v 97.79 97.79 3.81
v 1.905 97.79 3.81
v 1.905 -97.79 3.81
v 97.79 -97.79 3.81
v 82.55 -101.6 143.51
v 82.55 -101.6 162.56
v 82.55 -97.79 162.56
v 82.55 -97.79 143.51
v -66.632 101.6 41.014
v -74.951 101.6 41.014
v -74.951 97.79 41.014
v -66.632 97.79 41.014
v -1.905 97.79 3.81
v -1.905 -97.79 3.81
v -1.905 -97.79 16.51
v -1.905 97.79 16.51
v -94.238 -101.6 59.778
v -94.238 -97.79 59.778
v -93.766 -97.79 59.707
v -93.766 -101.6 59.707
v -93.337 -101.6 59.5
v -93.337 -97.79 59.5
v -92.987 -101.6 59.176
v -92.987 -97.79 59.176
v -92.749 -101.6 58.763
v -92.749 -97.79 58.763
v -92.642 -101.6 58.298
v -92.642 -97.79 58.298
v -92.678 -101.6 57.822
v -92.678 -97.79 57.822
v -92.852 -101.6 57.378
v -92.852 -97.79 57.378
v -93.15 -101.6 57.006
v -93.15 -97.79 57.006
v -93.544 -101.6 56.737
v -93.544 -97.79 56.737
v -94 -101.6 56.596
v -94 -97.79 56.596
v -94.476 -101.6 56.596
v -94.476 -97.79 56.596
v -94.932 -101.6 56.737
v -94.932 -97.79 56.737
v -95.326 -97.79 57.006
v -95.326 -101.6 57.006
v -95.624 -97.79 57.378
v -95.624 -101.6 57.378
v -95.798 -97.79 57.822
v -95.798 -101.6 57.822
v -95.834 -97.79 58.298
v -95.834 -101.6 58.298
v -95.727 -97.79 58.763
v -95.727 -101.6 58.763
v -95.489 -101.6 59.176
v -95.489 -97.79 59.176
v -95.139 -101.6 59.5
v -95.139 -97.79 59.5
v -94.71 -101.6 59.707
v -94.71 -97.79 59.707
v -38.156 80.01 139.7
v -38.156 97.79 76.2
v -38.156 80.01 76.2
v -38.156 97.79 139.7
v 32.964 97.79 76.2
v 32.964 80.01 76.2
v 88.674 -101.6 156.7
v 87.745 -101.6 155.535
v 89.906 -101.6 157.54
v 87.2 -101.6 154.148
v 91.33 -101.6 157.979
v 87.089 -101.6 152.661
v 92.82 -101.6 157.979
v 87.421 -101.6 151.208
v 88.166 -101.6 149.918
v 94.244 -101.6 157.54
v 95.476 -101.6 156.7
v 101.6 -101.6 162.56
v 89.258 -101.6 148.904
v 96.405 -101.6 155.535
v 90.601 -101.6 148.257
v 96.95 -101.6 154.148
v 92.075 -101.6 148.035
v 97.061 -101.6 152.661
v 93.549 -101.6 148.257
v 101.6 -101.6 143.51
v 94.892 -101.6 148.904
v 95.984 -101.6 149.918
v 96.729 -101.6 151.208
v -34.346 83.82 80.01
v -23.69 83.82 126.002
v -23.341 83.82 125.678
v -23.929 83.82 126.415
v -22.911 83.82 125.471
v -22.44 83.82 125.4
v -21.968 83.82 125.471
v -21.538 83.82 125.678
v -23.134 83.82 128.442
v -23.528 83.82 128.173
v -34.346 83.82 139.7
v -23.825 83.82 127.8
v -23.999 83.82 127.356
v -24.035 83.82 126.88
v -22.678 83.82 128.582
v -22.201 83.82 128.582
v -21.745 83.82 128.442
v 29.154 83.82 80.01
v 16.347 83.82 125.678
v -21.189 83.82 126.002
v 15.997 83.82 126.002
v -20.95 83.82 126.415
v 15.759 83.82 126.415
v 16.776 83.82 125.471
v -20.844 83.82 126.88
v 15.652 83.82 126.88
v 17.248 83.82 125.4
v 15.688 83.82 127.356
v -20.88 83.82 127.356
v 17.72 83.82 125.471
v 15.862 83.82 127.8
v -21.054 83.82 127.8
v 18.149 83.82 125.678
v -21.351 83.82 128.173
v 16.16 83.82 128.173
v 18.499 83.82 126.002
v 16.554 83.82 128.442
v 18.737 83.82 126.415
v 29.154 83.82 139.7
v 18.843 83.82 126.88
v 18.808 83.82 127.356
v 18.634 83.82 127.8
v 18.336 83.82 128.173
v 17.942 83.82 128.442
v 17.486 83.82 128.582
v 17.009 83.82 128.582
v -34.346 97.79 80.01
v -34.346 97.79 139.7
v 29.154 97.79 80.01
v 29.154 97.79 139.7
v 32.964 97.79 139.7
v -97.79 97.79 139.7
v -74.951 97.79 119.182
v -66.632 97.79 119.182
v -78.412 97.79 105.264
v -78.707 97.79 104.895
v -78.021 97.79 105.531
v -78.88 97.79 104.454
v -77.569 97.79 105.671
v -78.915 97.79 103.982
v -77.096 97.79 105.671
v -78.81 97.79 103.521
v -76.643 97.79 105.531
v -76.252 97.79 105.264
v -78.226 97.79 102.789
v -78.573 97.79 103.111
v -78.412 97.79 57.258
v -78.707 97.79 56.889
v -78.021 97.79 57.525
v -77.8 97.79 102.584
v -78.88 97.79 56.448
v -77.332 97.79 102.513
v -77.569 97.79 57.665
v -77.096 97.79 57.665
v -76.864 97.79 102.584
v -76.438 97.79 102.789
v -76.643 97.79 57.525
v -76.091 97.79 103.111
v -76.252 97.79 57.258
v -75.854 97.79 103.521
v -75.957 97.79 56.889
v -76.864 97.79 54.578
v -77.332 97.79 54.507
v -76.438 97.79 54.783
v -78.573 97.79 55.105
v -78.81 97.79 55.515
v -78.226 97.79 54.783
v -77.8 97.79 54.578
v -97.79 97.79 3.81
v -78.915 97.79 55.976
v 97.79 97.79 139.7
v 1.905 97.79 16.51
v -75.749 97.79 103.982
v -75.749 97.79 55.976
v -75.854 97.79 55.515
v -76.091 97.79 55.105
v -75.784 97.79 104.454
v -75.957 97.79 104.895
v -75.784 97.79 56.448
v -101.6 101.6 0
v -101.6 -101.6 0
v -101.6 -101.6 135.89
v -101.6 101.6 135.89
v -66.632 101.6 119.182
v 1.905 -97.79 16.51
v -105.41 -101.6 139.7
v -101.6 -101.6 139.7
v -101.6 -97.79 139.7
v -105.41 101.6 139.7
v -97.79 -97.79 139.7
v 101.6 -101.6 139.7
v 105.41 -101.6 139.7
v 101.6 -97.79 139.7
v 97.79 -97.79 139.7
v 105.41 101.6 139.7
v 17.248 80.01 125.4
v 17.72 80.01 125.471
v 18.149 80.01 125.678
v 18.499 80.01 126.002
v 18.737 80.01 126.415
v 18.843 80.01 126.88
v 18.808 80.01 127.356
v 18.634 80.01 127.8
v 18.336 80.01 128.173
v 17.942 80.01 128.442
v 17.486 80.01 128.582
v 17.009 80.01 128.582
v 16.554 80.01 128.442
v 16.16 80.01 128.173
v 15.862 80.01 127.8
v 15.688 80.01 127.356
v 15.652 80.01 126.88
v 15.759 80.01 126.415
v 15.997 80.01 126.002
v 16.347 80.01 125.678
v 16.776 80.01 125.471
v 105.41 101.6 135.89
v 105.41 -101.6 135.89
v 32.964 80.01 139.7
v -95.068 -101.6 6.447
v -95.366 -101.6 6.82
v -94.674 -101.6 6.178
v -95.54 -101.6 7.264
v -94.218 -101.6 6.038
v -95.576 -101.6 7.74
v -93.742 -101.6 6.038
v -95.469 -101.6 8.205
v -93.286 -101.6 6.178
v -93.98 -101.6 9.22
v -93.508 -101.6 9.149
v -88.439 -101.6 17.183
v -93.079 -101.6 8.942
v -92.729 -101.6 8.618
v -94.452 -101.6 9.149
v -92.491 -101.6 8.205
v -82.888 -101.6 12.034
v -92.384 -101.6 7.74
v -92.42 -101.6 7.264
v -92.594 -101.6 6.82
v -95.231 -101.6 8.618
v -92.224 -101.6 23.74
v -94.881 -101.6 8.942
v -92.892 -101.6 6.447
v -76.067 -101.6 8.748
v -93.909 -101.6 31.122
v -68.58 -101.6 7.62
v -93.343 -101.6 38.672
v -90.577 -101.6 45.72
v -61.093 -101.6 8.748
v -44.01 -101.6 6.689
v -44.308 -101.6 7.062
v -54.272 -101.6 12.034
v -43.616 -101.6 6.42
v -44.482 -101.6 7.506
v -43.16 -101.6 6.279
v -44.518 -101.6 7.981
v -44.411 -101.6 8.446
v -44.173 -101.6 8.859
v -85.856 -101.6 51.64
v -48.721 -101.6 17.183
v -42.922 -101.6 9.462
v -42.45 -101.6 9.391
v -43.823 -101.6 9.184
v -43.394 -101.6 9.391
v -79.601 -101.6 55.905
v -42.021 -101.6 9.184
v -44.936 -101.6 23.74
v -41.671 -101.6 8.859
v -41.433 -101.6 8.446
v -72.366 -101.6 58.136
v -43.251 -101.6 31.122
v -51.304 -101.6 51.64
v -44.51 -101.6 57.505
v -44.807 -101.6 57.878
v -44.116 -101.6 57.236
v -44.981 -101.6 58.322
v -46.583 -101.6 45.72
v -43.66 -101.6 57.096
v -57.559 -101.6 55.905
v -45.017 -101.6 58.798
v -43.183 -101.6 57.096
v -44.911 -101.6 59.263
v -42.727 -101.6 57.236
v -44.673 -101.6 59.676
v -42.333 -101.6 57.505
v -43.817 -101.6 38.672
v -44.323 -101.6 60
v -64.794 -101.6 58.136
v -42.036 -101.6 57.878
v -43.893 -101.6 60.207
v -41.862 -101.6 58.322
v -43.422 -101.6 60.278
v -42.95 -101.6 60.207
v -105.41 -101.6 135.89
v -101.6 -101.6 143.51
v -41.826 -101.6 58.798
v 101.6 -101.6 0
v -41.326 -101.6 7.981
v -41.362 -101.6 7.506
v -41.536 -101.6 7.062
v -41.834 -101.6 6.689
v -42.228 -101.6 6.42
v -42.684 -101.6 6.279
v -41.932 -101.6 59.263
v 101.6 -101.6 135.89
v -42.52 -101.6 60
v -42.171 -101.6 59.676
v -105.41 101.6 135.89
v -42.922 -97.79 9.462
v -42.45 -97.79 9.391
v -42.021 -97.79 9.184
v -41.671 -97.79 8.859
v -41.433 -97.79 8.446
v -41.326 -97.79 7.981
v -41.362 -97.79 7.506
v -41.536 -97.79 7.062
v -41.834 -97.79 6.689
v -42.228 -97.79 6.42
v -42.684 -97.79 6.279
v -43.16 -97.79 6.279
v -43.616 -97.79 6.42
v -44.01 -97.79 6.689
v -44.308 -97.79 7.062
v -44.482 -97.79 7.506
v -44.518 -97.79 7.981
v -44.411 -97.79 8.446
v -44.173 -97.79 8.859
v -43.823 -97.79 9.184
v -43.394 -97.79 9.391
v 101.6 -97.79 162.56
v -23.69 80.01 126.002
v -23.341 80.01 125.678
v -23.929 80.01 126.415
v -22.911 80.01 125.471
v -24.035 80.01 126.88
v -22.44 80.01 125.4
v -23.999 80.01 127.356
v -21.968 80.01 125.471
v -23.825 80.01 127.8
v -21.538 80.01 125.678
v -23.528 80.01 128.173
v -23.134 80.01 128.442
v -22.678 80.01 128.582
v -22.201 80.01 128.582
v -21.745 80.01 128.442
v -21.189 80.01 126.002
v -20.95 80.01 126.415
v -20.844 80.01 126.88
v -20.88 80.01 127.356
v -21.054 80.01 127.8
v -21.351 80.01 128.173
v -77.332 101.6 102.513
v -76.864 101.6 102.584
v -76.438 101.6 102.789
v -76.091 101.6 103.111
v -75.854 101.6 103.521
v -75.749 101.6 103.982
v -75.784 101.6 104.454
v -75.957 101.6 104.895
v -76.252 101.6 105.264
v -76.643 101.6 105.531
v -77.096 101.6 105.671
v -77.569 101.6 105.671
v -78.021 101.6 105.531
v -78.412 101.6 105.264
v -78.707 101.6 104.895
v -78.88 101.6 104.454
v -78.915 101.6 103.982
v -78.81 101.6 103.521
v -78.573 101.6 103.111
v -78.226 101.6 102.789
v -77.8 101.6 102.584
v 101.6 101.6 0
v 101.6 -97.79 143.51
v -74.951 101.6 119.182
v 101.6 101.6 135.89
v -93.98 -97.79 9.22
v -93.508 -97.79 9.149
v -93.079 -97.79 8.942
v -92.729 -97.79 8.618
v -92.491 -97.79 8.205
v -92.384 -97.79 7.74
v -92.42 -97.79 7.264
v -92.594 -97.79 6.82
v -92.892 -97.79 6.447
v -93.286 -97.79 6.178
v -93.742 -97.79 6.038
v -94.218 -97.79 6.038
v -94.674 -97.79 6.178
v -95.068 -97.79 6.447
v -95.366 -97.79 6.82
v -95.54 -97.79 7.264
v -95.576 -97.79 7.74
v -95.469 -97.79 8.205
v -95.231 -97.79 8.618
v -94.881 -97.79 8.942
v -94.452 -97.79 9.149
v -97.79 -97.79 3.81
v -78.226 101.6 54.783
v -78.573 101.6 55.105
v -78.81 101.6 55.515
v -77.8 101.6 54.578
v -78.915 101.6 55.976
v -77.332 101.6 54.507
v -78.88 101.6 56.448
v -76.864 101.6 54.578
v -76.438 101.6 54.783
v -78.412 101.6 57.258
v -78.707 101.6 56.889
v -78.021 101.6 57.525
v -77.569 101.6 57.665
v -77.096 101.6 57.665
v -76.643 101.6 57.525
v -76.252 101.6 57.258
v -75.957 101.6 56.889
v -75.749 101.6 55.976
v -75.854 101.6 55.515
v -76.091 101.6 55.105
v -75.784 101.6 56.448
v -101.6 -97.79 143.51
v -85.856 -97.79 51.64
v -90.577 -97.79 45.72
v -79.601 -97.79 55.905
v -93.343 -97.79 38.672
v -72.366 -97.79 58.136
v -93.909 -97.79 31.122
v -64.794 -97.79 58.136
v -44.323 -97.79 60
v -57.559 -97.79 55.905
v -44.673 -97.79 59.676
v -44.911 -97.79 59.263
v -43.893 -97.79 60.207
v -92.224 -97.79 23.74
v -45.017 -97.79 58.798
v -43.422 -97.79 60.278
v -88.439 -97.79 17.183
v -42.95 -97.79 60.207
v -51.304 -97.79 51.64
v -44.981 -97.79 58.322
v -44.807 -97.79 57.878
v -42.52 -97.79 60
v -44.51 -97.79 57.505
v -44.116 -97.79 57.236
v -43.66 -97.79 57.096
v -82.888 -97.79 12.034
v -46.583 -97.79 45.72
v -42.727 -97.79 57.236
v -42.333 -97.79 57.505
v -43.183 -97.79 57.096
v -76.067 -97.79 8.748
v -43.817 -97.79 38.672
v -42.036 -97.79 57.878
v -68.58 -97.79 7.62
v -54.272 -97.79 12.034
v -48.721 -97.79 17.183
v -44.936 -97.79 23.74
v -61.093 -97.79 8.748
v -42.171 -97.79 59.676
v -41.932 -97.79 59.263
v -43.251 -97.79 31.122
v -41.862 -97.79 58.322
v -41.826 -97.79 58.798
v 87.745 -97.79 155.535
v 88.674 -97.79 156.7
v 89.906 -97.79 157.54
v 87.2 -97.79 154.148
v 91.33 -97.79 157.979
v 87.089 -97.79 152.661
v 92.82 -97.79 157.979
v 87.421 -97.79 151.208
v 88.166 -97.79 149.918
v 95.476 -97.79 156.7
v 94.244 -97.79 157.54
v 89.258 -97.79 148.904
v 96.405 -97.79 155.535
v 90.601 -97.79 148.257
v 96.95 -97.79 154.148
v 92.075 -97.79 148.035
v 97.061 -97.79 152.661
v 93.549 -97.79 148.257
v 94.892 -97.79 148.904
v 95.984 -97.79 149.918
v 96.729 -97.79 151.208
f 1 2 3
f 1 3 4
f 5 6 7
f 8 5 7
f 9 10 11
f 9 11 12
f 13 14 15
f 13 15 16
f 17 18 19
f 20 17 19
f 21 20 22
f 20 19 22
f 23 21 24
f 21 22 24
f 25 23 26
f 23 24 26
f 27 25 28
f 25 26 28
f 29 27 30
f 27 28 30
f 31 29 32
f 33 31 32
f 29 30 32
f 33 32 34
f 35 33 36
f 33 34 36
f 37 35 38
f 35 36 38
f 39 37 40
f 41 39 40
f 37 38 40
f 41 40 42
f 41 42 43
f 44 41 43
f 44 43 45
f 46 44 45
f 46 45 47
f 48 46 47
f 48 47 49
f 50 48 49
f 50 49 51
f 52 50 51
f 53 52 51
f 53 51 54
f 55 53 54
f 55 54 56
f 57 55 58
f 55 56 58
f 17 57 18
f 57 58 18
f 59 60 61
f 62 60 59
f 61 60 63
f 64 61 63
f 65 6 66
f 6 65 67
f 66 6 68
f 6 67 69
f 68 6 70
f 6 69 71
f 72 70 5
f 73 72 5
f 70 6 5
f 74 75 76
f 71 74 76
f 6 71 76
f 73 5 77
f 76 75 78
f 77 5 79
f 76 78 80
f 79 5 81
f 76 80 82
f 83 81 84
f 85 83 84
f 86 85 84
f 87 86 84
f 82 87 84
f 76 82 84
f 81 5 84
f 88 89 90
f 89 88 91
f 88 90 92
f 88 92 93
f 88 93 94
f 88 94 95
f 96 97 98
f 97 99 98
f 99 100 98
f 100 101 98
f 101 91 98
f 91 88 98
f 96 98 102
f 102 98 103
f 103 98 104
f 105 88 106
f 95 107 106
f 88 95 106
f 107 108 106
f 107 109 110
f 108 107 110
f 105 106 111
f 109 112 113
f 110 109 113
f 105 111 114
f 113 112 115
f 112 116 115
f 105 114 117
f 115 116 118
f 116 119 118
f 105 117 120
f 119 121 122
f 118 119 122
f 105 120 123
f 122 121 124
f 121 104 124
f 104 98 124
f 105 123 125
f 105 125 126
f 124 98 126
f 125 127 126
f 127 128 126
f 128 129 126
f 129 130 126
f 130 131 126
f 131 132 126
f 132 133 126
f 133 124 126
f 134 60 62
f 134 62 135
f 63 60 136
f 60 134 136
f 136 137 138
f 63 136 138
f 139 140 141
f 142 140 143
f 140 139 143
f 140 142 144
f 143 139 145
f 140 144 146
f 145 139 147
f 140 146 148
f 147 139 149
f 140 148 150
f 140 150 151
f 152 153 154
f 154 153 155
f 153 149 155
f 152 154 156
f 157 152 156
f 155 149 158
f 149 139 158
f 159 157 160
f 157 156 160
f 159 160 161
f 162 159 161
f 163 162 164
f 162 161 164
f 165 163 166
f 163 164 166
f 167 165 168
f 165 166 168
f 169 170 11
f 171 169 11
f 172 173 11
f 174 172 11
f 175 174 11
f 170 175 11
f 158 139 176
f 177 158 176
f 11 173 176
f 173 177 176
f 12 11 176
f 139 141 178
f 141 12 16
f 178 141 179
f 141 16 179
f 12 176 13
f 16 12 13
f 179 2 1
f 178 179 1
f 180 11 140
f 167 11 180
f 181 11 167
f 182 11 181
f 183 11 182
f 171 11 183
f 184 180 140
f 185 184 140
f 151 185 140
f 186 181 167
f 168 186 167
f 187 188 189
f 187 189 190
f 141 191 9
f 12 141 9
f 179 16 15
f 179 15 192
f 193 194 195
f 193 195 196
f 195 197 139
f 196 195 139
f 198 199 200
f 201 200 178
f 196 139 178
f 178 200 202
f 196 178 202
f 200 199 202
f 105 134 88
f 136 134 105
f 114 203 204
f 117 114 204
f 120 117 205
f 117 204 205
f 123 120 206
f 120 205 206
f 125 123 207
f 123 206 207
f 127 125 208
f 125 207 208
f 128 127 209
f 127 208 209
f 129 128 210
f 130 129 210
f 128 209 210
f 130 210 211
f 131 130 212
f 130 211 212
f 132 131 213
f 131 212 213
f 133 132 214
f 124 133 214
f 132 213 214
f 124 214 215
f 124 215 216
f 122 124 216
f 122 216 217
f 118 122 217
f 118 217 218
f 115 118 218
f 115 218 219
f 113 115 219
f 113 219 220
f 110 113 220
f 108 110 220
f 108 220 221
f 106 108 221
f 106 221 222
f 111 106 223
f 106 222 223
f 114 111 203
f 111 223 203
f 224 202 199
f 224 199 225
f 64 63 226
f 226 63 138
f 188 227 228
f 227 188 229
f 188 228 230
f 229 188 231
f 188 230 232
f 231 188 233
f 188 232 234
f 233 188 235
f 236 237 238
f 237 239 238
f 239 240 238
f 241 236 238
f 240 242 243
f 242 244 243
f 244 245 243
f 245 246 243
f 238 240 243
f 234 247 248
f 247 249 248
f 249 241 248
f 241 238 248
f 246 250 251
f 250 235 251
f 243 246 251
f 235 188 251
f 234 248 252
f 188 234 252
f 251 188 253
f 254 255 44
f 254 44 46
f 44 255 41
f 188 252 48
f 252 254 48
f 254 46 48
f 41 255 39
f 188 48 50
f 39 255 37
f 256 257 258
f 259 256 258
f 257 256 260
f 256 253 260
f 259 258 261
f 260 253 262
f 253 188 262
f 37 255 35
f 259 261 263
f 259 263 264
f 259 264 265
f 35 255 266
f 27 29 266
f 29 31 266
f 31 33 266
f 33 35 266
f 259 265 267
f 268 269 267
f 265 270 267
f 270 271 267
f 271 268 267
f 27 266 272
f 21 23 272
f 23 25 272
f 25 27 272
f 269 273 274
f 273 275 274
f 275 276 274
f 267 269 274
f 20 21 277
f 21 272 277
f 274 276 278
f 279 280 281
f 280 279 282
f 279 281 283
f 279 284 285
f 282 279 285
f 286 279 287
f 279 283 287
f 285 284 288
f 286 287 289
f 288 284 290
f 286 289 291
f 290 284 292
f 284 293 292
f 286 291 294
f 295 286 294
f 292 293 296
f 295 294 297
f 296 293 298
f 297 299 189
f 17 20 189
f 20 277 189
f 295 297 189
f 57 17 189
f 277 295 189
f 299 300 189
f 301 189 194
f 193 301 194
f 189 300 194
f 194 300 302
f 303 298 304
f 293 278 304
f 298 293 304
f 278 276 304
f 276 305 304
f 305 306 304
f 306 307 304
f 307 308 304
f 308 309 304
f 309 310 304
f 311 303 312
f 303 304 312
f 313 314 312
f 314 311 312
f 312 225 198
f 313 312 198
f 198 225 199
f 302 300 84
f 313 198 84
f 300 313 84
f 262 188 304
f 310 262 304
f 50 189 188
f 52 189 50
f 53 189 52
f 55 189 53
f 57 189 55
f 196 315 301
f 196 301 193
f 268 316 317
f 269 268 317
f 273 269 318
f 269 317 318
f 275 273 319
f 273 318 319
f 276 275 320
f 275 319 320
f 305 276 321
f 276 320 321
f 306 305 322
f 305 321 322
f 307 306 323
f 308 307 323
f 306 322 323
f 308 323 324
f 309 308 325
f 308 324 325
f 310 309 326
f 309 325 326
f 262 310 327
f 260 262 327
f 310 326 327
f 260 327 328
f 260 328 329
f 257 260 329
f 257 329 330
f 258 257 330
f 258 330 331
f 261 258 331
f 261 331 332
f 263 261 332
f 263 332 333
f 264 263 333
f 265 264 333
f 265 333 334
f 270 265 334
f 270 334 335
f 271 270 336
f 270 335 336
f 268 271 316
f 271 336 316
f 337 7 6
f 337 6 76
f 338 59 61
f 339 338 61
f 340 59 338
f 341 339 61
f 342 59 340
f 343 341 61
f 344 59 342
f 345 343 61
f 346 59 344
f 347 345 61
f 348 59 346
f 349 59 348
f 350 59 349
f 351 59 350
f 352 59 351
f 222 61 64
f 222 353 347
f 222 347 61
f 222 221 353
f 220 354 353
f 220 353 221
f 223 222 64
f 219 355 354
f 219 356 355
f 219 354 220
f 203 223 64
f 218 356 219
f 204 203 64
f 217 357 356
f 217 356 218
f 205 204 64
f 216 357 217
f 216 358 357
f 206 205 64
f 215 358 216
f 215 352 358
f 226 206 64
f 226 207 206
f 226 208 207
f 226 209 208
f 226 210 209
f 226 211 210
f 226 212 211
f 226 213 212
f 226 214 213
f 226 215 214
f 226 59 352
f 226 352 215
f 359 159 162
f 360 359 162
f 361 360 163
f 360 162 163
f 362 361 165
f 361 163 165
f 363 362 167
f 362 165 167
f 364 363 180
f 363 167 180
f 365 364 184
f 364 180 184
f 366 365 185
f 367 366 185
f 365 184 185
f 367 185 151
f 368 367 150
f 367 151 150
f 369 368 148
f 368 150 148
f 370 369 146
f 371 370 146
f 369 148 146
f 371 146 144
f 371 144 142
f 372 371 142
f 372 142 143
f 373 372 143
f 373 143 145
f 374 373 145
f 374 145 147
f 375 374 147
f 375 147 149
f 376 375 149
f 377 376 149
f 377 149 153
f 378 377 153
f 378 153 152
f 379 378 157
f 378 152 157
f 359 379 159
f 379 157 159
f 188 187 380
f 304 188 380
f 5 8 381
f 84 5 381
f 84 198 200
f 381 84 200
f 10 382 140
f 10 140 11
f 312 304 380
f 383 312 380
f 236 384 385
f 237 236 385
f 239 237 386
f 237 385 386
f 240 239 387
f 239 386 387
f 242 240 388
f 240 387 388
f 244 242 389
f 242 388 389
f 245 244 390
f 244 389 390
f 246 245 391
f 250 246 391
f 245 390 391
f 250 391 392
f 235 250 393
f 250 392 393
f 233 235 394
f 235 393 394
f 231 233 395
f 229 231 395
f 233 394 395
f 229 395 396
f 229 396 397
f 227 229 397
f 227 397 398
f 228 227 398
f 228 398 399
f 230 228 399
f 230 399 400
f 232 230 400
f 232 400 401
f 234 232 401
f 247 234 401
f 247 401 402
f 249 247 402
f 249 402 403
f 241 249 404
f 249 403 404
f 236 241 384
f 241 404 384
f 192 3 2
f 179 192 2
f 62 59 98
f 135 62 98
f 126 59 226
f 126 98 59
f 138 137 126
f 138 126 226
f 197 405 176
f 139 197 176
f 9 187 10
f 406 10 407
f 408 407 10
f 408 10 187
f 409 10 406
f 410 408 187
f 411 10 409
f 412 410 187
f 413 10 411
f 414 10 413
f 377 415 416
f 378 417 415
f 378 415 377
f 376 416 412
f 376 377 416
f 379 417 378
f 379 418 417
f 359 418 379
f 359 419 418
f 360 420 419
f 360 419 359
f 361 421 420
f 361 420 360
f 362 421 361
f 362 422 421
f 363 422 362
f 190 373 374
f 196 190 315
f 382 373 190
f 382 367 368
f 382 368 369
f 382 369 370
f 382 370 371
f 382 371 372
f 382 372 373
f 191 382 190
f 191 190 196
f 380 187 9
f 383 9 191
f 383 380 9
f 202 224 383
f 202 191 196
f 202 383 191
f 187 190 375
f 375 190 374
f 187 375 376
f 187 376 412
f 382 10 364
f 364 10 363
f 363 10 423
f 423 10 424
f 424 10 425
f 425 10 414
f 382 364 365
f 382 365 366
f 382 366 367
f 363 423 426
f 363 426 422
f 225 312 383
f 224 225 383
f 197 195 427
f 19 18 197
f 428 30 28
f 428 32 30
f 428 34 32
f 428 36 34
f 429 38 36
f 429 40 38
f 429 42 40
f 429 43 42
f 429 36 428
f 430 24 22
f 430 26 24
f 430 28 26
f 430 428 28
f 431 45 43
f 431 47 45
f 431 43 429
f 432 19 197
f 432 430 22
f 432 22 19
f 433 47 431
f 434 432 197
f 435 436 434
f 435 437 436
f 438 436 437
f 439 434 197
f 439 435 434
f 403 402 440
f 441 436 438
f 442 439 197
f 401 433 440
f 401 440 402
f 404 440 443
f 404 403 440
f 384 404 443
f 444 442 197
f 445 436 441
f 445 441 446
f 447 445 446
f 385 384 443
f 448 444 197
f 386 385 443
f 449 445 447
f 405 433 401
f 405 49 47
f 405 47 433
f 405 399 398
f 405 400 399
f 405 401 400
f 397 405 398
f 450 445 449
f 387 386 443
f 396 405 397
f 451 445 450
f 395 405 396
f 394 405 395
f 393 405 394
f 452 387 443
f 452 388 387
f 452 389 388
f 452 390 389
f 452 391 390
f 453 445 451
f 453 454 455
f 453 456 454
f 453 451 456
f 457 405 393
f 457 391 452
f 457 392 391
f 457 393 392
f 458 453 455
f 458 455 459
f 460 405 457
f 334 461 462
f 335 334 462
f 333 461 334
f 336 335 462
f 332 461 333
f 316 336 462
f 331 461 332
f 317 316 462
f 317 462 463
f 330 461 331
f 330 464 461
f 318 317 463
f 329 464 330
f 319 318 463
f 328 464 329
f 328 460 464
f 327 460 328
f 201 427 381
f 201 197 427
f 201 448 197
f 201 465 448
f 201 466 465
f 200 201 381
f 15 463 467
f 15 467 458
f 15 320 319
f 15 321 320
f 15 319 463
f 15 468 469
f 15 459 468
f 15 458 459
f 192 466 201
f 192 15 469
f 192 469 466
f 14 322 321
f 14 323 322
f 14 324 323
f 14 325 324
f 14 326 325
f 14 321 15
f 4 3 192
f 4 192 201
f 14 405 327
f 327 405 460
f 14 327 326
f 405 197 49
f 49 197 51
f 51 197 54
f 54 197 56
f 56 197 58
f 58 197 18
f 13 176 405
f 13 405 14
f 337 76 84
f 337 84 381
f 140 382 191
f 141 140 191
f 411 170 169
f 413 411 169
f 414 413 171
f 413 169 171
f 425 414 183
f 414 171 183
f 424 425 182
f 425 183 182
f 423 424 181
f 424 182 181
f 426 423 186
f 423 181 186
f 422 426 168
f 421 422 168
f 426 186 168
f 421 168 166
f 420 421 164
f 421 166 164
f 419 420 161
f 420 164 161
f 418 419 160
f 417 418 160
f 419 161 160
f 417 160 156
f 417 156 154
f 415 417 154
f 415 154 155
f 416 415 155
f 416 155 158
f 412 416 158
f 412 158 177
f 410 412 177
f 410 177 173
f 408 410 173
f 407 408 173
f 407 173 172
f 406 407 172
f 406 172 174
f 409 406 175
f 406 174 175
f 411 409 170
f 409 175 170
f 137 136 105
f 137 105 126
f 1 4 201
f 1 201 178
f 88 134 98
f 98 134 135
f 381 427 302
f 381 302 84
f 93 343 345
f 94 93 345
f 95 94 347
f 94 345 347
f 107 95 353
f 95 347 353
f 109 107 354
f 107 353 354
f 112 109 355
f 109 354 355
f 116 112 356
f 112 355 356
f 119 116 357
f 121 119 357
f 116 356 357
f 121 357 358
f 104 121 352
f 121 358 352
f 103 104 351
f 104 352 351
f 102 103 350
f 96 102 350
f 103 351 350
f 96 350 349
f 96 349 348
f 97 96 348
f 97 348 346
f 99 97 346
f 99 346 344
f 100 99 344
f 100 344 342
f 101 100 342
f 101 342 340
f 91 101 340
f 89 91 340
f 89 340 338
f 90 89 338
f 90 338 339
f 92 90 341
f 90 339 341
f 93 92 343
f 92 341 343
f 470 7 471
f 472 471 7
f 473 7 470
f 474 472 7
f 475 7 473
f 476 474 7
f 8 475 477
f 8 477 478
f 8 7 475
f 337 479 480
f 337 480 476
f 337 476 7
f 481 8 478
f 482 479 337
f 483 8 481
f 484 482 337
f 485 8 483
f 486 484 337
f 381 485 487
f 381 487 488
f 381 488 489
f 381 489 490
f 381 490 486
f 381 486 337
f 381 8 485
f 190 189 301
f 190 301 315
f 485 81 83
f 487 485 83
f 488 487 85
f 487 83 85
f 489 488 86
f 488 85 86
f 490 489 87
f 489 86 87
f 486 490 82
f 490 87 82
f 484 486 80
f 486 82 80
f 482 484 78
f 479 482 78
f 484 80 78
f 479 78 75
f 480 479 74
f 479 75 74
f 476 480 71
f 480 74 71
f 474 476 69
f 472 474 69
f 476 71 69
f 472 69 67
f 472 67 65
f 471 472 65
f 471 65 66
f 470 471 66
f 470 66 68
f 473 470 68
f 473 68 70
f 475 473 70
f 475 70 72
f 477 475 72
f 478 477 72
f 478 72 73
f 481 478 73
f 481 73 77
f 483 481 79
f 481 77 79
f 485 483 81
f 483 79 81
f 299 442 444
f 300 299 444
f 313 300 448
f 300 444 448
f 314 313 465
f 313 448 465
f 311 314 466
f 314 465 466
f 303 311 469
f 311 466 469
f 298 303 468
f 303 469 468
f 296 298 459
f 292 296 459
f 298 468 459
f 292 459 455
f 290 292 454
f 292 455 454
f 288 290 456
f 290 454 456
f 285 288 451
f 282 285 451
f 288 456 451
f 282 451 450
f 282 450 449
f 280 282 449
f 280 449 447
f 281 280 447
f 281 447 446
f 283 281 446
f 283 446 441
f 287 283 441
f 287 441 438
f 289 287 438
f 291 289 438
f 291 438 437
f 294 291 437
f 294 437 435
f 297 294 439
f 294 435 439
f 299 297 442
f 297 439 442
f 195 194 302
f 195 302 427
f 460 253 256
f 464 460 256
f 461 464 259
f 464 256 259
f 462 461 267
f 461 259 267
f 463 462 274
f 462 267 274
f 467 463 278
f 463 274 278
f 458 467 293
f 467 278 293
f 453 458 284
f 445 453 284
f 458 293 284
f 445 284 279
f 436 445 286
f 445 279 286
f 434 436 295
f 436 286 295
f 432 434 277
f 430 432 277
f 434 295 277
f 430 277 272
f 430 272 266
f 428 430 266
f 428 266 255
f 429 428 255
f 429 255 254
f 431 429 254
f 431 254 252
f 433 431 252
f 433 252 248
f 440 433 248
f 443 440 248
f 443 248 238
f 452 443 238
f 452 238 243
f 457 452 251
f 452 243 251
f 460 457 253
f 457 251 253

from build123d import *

# Parameters (mm, degrees)
SKETCH1_W              = 203.2
SKETCH1_H              = 203.2
OUTTER_BOX_DEPTH       = 139.7
SHELL1_T               = -3.81
SKETCH4_W              = 71.12
SKETCH4_H              = 63.5
RFID_CARD_HOLDER_DEPTH = 17.78
SHELL2_T               = -3.81
SKETCH6_W              = 203.2
SKETCH6_H              = 3.81
BOSS_EXTRUDE4_DEPTH    = 3.81
SKETCH12_W             = 8.3185
SKETCH12_H             = 78.1685
CUT_EXTRUDE7_DEPTH     = 3.81
SKETCH13_W             = 3.81
SKETCH13_H             = 203.2
BOSS_EXTRUDE5_DEPTH    = 3.81
SKETCH14_W             = 3.81
SKETCH14_H             = 203.2
BOSS_EXTRUDE6_DEPTH    = 3.81
SKETCH16_W             = 19.05
SKETCH16_H             = 3.81
BOSS_EXTRUDE7_DEPTH    = 19.05
SKETCH18_R             = 5
CUT_EXTRUDE9_DEPTH     = 3.81
SKETCH5_R              = 25.4
CUT_EXTRUDE10_DEPTH    = 3.81
SKETCH19_R             = 1.6
CUT_EXTRUDE11_DEPTH    = 3.81
SKETCH20_R             = 1.6
CUT_EXTRUDE12_DEPTH    = 3.81
SKETCH21_W             = 3.81
SKETCH21_H             = 195.58
BOSS_EXTRUDE9_DEPTH    = 12.7
SKETCH23_R             = 1.5875
CUT_EXTRUDE13_DEPTH    = 3.81


with BuildPart() as part:
    # Sketch1 → Outter Box (new body)
    with BuildSketch(Plane.XY):
        Rectangle(SKETCH1_W, SKETCH1_H)
    extrude(amount=OUTTER_BOX_DEPTH)

    # Shell1
    shell1_openings = [part.faces().sort_by_distance(p)[0] for p in [
        (0, 0, 139.7),
    ]]
    offset(amount=SHELL1_T, openings=shell1_openings, kind=Kind.INTERSECTION)

    # Sketch12 → Cut-Extrude7 (cut)
    with BuildSketch(Plane(origin=(0, 101.6, 0), x_dir=(1, 0, 0), z_dir=(0, 1, 0))):
        with Locations((-70.791632516, -80.097769103)):
            Rectangle(SKETCH12_W, SKETCH12_H)
    extrude(amount=-CUT_EXTRUDE7_DEPTH, mode=Mode.SUBTRACT)



with BuildPart() as body_2:
    # Sketch4 → RFID Card holder (new body)
    with BuildSketch(Plane.XZ.offset(-97.79)):
        with Locations((-2.595784724, 107.95)):
            Rectangle(SKETCH4_W, SKETCH4_H)
    extrude(amount=RFID_CARD_HOLDER_DEPTH)

    # Shell2
    shell2_openings = [body_2.faces().sort_by_distance(p)[0] for p in [
        (-2.595784724, 97.79, 107.95),
        (-2.595784724, 88.9, 139.7),
    ]]
    offset(amount=SHELL2_T, openings=shell2_openings, kind=Kind.INTERSECTION)

    # Sketch19 → Cut-Extrude11 (cut)
    with BuildSketch(Plane.XZ.offset(-80.01)):
        with Locations(Location((-22.439534724, 127, 0), (0, 0, 270))):
            Circle(SKETCH19_R)
        with Locations(Location((17.247965276, 127, 0), (0, 0, 270))):
            Circle(SKETCH19_R)
    extrude(amount=-CUT_EXTRUDE11_DEPTH, mode=Mode.SUBTRACT)


with BuildPart() as body_3:
    # Sketch6 → Boss-Extrude4 (new body)
    with BuildSketch(Plane.XY.offset(139.7)):
        with Locations((0, -99.695)):
            Rectangle(SKETCH6_W, SKETCH6_H)
    extrude(amount=BOSS_EXTRUDE4_DEPTH)


with BuildPart() as part_1:
    add(part.part)

    add(body_3.part)  # Boss-Extrude5 merges body 3
    # Sketch13 → Boss-Extrude5 (add)
    with BuildSketch(Plane(origin=(101.6, 0, 0), x_dir=(0, 0, -1), z_dir=(1, 0, 0))):
        with Locations((-137.795, 0)):
            Rectangle(SKETCH13_W, SKETCH13_H)
    extrude(amount=BOSS_EXTRUDE5_DEPTH)

    # Sketch14 → Boss-Extrude6 (add)
    with BuildSketch(Plane.ZY.offset(101.6)):
        with Locations((137.795, 0)):
            Rectangle(SKETCH14_W, SKETCH14_H)
    extrude(amount=BOSS_EXTRUDE6_DEPTH)

    # Sketch5 → Cut-Extrude10 (cut)
    with BuildSketch(Plane.XZ.offset(101.6)):
        with Locations(Location((-68.58, 33.02, 0), (0, 0, 270))):
            Circle(SKETCH5_R)
    extrude(amount=-CUT_EXTRUDE10_DEPTH, mode=Mode.SUBTRACT)

    # Sketch20 → Cut-Extrude12 (cut)
    with BuildSketch(Plane(origin=(0, -97.79, 0), x_dir=(1, 0, 0), z_dir=(0, 1, 0))):
        with Locations(Location((-94.237978912, -58.178415522, 0), (0, 0, 270))):
            Circle(SKETCH20_R)
        with Locations(Location((-43.421584478, -58.677978912, 0), (0, 0, 270))):
            Circle(SKETCH20_R)
        with Locations(Location((-42.922021088, -7.861584478, 0), (0, 0, 270))):
            Circle(SKETCH20_R)
        with Locations(Location((-93.980000617, -7.619999383, 0), (0, 0, 270))):
            Circle(SKETCH20_R)
    extrude(amount=-CUT_EXTRUDE12_DEPTH, mode=Mode.SUBTRACT)

    # Sketch21 → Boss-Extrude9 (add)
    with BuildSketch(Plane.XY.offset(3.81)):
        Rectangle(SKETCH21_W, SKETCH21_H)
    extrude(amount=BOSS_EXTRUDE9_DEPTH)

    # Sketch23 → Cut-Extrude13 (cut)
    with BuildSketch(Plane.XZ.offset(-97.79)):
        with Locations(Location((-77.332132516, 56.094769103, 0), (0, 0, 270))):
            Circle(SKETCH23_R)
        with Locations(Location((-77.332132516, 104.100769103, 0), (0, 0, 270))):
            Circle(SKETCH23_R)
    extrude(amount=-CUT_EXTRUDE13_DEPTH, mode=Mode.SUBTRACT)


with BuildPart() as body_3_2:
    # Sketch16 → Boss-Extrude7 (new body)
    with BuildSketch(Plane.XY.offset(143.51)):
        with Locations((92.075, -99.695)):
            Rectangle(SKETCH16_W, SKETCH16_H)
    extrude(amount=BOSS_EXTRUDE7_DEPTH)

    # Sketch18 → Cut-Extrude9 (cut)
    with BuildSketch(Plane.XZ.offset(101.6)):
        with Locations(Location((92.075, 153.035, 0), (0, 0, 270))):
            Circle(SKETCH18_R)
    extrude(amount=-CUT_EXTRUDE9_DEPTH, mode=Mode.SUBTRACT)


solid = Compound([body_2.part, part_1.part, body_3_2.part])
